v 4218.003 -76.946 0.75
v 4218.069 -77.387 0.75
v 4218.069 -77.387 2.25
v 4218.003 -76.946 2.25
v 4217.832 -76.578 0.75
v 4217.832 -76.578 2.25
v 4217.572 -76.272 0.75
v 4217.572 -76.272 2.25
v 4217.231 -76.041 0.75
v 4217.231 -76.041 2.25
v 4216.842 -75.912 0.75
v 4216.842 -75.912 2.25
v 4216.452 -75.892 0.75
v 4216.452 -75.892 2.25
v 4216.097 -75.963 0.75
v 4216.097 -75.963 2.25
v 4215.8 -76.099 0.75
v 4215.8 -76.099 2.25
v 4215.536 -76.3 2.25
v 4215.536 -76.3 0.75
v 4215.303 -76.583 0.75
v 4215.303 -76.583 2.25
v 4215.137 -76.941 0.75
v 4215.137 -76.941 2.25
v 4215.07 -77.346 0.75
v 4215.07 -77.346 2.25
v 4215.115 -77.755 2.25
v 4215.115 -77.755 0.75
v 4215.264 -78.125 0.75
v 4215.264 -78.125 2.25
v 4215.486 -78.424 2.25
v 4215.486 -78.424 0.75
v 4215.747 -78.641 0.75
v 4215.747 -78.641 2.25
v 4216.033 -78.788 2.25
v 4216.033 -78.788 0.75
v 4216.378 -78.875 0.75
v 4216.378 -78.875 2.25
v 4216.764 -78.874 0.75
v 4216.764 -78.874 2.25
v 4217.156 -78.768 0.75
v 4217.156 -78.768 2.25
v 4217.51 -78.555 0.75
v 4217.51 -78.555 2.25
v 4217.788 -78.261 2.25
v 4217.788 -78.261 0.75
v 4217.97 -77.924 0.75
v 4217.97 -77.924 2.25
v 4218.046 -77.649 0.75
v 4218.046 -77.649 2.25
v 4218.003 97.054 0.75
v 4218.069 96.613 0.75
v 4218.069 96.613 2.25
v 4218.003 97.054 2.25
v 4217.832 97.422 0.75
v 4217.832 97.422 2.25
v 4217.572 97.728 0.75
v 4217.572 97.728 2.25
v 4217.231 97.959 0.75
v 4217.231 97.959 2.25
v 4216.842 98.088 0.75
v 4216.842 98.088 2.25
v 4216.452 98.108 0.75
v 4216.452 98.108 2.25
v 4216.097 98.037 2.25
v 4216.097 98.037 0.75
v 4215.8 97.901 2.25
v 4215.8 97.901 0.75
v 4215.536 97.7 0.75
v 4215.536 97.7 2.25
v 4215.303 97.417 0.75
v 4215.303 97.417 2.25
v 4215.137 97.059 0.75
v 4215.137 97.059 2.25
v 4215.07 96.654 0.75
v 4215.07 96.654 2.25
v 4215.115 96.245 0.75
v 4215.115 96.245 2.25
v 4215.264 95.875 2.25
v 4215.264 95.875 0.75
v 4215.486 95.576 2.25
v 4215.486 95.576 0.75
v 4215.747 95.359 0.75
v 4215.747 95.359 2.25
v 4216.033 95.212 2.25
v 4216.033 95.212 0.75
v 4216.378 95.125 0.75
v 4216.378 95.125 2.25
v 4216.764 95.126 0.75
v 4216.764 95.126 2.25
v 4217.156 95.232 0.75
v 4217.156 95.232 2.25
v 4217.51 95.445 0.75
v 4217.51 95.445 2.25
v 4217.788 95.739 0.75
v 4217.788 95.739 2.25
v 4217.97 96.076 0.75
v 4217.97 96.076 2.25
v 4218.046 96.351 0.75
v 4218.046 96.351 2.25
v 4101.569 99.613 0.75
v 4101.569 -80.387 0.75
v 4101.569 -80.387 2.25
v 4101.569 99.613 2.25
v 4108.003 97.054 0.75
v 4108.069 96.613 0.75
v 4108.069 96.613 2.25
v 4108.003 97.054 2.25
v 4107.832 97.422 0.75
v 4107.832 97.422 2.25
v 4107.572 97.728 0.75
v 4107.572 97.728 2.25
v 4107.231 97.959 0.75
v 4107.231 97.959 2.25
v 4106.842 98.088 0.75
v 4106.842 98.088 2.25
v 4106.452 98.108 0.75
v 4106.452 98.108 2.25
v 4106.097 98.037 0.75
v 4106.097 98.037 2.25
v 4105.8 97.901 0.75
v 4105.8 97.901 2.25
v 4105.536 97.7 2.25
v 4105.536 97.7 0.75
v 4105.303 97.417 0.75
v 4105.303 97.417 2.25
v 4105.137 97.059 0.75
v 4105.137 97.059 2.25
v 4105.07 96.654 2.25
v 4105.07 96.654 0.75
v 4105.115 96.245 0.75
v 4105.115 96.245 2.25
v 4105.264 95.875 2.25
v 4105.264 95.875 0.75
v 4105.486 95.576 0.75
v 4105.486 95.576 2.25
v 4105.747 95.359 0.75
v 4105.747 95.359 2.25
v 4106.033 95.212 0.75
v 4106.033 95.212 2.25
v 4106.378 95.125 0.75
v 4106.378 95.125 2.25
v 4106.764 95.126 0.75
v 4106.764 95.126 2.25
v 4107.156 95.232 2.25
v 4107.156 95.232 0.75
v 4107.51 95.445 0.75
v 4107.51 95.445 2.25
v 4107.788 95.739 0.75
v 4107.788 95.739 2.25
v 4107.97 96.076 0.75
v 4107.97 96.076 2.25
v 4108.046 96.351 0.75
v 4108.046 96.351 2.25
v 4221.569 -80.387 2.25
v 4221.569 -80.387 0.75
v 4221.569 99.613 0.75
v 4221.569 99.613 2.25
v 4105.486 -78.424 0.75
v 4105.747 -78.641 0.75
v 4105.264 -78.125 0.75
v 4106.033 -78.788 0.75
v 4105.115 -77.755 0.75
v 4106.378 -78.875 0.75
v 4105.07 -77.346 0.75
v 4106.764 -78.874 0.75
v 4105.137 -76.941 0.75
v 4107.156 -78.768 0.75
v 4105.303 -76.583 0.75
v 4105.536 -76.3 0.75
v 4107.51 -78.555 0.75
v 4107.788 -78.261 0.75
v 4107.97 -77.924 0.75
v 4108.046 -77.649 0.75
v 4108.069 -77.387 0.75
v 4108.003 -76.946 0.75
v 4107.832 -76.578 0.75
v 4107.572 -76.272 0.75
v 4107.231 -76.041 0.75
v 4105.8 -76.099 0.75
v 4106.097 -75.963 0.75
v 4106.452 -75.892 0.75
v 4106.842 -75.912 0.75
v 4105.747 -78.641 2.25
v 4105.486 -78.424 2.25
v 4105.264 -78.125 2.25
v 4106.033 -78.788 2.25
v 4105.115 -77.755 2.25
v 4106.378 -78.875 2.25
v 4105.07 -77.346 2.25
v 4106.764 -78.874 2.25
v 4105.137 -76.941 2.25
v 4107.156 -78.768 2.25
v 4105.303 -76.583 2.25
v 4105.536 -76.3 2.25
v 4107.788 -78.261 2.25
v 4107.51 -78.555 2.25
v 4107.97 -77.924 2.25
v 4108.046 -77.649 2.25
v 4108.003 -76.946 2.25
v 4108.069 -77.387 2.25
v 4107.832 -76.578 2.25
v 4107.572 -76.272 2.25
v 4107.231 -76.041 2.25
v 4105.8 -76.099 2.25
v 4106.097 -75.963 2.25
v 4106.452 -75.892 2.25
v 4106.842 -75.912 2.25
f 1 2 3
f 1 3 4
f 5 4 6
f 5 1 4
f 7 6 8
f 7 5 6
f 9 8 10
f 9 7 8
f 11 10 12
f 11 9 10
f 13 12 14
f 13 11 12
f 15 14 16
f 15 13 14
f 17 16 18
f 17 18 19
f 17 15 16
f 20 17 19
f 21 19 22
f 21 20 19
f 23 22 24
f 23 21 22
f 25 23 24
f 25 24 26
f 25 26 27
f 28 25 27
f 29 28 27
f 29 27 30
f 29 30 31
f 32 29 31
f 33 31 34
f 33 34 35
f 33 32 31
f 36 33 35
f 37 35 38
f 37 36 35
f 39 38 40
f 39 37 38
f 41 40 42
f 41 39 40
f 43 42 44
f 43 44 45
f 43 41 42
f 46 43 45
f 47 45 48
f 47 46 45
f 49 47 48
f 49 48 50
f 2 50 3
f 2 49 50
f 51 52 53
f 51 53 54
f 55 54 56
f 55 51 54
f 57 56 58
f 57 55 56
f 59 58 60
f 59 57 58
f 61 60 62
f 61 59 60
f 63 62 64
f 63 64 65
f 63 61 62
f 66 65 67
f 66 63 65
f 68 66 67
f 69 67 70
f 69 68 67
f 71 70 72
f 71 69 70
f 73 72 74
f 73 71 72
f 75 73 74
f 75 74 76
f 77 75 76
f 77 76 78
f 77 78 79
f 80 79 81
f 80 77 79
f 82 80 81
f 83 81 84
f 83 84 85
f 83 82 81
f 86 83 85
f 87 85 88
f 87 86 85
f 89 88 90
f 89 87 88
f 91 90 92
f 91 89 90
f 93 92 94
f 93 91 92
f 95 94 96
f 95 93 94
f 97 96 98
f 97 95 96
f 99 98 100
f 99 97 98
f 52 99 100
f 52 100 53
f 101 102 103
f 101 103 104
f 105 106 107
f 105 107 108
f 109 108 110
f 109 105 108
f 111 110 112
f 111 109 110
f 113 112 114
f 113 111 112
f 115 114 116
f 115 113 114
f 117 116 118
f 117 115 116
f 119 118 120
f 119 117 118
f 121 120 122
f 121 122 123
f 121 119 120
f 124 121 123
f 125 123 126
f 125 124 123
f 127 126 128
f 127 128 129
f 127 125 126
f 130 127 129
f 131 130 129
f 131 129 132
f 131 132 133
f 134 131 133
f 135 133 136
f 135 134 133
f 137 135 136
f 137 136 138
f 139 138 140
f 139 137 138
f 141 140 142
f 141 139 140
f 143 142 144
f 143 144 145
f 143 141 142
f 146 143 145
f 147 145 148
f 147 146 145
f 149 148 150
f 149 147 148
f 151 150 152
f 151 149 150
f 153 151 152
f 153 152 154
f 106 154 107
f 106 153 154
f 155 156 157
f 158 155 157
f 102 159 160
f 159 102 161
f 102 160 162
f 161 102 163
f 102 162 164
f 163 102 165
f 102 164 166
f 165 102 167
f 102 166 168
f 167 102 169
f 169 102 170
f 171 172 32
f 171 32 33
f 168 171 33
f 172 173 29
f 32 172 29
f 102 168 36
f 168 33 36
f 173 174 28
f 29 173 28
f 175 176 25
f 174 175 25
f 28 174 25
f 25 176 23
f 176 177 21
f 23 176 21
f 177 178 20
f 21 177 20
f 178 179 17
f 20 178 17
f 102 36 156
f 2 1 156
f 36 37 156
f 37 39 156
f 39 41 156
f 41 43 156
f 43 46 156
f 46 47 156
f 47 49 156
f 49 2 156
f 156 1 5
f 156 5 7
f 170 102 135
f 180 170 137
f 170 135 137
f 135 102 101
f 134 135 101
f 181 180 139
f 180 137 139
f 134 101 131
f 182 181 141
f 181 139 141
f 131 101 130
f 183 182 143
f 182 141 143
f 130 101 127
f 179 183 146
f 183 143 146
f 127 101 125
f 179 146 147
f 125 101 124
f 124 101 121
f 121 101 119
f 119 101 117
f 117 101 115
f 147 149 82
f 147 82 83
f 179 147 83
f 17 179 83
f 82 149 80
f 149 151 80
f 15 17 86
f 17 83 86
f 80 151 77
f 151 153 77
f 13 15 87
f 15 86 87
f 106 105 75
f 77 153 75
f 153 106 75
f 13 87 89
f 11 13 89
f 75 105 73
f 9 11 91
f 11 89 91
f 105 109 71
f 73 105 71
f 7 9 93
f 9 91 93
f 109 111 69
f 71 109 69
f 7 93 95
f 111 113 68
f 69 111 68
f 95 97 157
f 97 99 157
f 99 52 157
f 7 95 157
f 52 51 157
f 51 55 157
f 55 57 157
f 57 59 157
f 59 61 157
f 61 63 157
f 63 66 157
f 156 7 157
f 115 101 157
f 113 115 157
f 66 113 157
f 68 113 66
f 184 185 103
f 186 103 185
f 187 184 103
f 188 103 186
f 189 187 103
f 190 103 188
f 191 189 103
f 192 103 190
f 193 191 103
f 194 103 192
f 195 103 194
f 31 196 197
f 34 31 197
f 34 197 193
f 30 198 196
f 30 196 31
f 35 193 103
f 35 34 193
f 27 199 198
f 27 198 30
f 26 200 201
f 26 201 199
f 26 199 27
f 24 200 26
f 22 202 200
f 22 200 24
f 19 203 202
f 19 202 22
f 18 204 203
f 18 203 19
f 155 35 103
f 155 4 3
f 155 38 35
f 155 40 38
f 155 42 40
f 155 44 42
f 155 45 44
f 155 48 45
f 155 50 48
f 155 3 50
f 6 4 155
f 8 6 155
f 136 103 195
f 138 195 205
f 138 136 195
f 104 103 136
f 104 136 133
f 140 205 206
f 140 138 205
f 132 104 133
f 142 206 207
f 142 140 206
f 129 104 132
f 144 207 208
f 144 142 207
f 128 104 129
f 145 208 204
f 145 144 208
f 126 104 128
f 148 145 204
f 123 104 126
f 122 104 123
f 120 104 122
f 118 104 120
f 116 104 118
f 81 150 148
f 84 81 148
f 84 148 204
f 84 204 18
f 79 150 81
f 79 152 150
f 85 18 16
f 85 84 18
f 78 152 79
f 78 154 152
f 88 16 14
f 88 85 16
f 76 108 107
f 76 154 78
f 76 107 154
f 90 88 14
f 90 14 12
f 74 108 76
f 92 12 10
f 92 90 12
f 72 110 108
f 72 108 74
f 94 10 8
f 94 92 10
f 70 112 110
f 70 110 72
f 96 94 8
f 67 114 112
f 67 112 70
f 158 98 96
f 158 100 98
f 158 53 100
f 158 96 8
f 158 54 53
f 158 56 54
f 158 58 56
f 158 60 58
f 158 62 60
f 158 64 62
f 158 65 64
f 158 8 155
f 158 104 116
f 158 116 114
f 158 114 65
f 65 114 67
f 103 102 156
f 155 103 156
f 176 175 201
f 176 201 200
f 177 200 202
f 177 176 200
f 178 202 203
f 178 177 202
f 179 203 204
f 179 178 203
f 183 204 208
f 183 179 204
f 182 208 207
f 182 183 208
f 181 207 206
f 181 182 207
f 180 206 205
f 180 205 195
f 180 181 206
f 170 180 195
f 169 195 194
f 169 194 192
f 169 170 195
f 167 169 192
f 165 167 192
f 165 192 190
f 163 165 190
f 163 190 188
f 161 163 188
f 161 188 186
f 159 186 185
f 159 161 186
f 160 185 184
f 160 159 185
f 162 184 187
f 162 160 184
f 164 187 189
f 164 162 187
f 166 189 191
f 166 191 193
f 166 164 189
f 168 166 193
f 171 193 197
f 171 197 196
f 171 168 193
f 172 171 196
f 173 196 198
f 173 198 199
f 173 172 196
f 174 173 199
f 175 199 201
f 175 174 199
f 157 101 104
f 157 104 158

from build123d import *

# Parameters (mm, degrees)
SKETCH_1_W      = 1200
SKETCH_1_H      = 1800
SKETCH_1_R      = 15
EXTRUDE_1_DEPTH = 3
SCALE_1_SCALE_X = 0.1
SCALE_1_SCALE_Y = 0.1
SCALE_1_SCALE_Z = 0.5


with BuildPart() as part:
    # 草图1 → 凸台-拉伸1 (new body)
    with BuildSketch(Plane.XY):
        with Locations((4161.569311854, 9.612957927)):
            Rectangle(SKETCH_1_W, SKETCH_1_H)
        with Locations((3611.569311854, 879.612957927)):
            Circle(SKETCH_1_R, mode=Mode.SUBTRACT)
        with Locations((4711.569311854, 879.612957927)):
            Circle(SKETCH_1_R, mode=Mode.SUBTRACT)
        with Locations((3611.569311854, -860.387042073)):
            Circle(SKETCH_1_R, mode=Mode.SUBTRACT)
        with Locations((4711.569311854, -860.387042073)):
            Circle(SKETCH_1_R, mode=Mode.SUBTRACT)
    extrude(amount=EXTRUDE_1_DEPTH)


with BuildPart() as part_1:
    # 缩放比例1: scaled about (4161.569311854, 9.612957927, 1.5)
    add(part.part.scale((SCALE_1_SCALE_X, SCALE_1_SCALE_Y, SCALE_1_SCALE_Z), about=(4161.569311854, 9.612957927, 1.5)))


solid = part_1.part
